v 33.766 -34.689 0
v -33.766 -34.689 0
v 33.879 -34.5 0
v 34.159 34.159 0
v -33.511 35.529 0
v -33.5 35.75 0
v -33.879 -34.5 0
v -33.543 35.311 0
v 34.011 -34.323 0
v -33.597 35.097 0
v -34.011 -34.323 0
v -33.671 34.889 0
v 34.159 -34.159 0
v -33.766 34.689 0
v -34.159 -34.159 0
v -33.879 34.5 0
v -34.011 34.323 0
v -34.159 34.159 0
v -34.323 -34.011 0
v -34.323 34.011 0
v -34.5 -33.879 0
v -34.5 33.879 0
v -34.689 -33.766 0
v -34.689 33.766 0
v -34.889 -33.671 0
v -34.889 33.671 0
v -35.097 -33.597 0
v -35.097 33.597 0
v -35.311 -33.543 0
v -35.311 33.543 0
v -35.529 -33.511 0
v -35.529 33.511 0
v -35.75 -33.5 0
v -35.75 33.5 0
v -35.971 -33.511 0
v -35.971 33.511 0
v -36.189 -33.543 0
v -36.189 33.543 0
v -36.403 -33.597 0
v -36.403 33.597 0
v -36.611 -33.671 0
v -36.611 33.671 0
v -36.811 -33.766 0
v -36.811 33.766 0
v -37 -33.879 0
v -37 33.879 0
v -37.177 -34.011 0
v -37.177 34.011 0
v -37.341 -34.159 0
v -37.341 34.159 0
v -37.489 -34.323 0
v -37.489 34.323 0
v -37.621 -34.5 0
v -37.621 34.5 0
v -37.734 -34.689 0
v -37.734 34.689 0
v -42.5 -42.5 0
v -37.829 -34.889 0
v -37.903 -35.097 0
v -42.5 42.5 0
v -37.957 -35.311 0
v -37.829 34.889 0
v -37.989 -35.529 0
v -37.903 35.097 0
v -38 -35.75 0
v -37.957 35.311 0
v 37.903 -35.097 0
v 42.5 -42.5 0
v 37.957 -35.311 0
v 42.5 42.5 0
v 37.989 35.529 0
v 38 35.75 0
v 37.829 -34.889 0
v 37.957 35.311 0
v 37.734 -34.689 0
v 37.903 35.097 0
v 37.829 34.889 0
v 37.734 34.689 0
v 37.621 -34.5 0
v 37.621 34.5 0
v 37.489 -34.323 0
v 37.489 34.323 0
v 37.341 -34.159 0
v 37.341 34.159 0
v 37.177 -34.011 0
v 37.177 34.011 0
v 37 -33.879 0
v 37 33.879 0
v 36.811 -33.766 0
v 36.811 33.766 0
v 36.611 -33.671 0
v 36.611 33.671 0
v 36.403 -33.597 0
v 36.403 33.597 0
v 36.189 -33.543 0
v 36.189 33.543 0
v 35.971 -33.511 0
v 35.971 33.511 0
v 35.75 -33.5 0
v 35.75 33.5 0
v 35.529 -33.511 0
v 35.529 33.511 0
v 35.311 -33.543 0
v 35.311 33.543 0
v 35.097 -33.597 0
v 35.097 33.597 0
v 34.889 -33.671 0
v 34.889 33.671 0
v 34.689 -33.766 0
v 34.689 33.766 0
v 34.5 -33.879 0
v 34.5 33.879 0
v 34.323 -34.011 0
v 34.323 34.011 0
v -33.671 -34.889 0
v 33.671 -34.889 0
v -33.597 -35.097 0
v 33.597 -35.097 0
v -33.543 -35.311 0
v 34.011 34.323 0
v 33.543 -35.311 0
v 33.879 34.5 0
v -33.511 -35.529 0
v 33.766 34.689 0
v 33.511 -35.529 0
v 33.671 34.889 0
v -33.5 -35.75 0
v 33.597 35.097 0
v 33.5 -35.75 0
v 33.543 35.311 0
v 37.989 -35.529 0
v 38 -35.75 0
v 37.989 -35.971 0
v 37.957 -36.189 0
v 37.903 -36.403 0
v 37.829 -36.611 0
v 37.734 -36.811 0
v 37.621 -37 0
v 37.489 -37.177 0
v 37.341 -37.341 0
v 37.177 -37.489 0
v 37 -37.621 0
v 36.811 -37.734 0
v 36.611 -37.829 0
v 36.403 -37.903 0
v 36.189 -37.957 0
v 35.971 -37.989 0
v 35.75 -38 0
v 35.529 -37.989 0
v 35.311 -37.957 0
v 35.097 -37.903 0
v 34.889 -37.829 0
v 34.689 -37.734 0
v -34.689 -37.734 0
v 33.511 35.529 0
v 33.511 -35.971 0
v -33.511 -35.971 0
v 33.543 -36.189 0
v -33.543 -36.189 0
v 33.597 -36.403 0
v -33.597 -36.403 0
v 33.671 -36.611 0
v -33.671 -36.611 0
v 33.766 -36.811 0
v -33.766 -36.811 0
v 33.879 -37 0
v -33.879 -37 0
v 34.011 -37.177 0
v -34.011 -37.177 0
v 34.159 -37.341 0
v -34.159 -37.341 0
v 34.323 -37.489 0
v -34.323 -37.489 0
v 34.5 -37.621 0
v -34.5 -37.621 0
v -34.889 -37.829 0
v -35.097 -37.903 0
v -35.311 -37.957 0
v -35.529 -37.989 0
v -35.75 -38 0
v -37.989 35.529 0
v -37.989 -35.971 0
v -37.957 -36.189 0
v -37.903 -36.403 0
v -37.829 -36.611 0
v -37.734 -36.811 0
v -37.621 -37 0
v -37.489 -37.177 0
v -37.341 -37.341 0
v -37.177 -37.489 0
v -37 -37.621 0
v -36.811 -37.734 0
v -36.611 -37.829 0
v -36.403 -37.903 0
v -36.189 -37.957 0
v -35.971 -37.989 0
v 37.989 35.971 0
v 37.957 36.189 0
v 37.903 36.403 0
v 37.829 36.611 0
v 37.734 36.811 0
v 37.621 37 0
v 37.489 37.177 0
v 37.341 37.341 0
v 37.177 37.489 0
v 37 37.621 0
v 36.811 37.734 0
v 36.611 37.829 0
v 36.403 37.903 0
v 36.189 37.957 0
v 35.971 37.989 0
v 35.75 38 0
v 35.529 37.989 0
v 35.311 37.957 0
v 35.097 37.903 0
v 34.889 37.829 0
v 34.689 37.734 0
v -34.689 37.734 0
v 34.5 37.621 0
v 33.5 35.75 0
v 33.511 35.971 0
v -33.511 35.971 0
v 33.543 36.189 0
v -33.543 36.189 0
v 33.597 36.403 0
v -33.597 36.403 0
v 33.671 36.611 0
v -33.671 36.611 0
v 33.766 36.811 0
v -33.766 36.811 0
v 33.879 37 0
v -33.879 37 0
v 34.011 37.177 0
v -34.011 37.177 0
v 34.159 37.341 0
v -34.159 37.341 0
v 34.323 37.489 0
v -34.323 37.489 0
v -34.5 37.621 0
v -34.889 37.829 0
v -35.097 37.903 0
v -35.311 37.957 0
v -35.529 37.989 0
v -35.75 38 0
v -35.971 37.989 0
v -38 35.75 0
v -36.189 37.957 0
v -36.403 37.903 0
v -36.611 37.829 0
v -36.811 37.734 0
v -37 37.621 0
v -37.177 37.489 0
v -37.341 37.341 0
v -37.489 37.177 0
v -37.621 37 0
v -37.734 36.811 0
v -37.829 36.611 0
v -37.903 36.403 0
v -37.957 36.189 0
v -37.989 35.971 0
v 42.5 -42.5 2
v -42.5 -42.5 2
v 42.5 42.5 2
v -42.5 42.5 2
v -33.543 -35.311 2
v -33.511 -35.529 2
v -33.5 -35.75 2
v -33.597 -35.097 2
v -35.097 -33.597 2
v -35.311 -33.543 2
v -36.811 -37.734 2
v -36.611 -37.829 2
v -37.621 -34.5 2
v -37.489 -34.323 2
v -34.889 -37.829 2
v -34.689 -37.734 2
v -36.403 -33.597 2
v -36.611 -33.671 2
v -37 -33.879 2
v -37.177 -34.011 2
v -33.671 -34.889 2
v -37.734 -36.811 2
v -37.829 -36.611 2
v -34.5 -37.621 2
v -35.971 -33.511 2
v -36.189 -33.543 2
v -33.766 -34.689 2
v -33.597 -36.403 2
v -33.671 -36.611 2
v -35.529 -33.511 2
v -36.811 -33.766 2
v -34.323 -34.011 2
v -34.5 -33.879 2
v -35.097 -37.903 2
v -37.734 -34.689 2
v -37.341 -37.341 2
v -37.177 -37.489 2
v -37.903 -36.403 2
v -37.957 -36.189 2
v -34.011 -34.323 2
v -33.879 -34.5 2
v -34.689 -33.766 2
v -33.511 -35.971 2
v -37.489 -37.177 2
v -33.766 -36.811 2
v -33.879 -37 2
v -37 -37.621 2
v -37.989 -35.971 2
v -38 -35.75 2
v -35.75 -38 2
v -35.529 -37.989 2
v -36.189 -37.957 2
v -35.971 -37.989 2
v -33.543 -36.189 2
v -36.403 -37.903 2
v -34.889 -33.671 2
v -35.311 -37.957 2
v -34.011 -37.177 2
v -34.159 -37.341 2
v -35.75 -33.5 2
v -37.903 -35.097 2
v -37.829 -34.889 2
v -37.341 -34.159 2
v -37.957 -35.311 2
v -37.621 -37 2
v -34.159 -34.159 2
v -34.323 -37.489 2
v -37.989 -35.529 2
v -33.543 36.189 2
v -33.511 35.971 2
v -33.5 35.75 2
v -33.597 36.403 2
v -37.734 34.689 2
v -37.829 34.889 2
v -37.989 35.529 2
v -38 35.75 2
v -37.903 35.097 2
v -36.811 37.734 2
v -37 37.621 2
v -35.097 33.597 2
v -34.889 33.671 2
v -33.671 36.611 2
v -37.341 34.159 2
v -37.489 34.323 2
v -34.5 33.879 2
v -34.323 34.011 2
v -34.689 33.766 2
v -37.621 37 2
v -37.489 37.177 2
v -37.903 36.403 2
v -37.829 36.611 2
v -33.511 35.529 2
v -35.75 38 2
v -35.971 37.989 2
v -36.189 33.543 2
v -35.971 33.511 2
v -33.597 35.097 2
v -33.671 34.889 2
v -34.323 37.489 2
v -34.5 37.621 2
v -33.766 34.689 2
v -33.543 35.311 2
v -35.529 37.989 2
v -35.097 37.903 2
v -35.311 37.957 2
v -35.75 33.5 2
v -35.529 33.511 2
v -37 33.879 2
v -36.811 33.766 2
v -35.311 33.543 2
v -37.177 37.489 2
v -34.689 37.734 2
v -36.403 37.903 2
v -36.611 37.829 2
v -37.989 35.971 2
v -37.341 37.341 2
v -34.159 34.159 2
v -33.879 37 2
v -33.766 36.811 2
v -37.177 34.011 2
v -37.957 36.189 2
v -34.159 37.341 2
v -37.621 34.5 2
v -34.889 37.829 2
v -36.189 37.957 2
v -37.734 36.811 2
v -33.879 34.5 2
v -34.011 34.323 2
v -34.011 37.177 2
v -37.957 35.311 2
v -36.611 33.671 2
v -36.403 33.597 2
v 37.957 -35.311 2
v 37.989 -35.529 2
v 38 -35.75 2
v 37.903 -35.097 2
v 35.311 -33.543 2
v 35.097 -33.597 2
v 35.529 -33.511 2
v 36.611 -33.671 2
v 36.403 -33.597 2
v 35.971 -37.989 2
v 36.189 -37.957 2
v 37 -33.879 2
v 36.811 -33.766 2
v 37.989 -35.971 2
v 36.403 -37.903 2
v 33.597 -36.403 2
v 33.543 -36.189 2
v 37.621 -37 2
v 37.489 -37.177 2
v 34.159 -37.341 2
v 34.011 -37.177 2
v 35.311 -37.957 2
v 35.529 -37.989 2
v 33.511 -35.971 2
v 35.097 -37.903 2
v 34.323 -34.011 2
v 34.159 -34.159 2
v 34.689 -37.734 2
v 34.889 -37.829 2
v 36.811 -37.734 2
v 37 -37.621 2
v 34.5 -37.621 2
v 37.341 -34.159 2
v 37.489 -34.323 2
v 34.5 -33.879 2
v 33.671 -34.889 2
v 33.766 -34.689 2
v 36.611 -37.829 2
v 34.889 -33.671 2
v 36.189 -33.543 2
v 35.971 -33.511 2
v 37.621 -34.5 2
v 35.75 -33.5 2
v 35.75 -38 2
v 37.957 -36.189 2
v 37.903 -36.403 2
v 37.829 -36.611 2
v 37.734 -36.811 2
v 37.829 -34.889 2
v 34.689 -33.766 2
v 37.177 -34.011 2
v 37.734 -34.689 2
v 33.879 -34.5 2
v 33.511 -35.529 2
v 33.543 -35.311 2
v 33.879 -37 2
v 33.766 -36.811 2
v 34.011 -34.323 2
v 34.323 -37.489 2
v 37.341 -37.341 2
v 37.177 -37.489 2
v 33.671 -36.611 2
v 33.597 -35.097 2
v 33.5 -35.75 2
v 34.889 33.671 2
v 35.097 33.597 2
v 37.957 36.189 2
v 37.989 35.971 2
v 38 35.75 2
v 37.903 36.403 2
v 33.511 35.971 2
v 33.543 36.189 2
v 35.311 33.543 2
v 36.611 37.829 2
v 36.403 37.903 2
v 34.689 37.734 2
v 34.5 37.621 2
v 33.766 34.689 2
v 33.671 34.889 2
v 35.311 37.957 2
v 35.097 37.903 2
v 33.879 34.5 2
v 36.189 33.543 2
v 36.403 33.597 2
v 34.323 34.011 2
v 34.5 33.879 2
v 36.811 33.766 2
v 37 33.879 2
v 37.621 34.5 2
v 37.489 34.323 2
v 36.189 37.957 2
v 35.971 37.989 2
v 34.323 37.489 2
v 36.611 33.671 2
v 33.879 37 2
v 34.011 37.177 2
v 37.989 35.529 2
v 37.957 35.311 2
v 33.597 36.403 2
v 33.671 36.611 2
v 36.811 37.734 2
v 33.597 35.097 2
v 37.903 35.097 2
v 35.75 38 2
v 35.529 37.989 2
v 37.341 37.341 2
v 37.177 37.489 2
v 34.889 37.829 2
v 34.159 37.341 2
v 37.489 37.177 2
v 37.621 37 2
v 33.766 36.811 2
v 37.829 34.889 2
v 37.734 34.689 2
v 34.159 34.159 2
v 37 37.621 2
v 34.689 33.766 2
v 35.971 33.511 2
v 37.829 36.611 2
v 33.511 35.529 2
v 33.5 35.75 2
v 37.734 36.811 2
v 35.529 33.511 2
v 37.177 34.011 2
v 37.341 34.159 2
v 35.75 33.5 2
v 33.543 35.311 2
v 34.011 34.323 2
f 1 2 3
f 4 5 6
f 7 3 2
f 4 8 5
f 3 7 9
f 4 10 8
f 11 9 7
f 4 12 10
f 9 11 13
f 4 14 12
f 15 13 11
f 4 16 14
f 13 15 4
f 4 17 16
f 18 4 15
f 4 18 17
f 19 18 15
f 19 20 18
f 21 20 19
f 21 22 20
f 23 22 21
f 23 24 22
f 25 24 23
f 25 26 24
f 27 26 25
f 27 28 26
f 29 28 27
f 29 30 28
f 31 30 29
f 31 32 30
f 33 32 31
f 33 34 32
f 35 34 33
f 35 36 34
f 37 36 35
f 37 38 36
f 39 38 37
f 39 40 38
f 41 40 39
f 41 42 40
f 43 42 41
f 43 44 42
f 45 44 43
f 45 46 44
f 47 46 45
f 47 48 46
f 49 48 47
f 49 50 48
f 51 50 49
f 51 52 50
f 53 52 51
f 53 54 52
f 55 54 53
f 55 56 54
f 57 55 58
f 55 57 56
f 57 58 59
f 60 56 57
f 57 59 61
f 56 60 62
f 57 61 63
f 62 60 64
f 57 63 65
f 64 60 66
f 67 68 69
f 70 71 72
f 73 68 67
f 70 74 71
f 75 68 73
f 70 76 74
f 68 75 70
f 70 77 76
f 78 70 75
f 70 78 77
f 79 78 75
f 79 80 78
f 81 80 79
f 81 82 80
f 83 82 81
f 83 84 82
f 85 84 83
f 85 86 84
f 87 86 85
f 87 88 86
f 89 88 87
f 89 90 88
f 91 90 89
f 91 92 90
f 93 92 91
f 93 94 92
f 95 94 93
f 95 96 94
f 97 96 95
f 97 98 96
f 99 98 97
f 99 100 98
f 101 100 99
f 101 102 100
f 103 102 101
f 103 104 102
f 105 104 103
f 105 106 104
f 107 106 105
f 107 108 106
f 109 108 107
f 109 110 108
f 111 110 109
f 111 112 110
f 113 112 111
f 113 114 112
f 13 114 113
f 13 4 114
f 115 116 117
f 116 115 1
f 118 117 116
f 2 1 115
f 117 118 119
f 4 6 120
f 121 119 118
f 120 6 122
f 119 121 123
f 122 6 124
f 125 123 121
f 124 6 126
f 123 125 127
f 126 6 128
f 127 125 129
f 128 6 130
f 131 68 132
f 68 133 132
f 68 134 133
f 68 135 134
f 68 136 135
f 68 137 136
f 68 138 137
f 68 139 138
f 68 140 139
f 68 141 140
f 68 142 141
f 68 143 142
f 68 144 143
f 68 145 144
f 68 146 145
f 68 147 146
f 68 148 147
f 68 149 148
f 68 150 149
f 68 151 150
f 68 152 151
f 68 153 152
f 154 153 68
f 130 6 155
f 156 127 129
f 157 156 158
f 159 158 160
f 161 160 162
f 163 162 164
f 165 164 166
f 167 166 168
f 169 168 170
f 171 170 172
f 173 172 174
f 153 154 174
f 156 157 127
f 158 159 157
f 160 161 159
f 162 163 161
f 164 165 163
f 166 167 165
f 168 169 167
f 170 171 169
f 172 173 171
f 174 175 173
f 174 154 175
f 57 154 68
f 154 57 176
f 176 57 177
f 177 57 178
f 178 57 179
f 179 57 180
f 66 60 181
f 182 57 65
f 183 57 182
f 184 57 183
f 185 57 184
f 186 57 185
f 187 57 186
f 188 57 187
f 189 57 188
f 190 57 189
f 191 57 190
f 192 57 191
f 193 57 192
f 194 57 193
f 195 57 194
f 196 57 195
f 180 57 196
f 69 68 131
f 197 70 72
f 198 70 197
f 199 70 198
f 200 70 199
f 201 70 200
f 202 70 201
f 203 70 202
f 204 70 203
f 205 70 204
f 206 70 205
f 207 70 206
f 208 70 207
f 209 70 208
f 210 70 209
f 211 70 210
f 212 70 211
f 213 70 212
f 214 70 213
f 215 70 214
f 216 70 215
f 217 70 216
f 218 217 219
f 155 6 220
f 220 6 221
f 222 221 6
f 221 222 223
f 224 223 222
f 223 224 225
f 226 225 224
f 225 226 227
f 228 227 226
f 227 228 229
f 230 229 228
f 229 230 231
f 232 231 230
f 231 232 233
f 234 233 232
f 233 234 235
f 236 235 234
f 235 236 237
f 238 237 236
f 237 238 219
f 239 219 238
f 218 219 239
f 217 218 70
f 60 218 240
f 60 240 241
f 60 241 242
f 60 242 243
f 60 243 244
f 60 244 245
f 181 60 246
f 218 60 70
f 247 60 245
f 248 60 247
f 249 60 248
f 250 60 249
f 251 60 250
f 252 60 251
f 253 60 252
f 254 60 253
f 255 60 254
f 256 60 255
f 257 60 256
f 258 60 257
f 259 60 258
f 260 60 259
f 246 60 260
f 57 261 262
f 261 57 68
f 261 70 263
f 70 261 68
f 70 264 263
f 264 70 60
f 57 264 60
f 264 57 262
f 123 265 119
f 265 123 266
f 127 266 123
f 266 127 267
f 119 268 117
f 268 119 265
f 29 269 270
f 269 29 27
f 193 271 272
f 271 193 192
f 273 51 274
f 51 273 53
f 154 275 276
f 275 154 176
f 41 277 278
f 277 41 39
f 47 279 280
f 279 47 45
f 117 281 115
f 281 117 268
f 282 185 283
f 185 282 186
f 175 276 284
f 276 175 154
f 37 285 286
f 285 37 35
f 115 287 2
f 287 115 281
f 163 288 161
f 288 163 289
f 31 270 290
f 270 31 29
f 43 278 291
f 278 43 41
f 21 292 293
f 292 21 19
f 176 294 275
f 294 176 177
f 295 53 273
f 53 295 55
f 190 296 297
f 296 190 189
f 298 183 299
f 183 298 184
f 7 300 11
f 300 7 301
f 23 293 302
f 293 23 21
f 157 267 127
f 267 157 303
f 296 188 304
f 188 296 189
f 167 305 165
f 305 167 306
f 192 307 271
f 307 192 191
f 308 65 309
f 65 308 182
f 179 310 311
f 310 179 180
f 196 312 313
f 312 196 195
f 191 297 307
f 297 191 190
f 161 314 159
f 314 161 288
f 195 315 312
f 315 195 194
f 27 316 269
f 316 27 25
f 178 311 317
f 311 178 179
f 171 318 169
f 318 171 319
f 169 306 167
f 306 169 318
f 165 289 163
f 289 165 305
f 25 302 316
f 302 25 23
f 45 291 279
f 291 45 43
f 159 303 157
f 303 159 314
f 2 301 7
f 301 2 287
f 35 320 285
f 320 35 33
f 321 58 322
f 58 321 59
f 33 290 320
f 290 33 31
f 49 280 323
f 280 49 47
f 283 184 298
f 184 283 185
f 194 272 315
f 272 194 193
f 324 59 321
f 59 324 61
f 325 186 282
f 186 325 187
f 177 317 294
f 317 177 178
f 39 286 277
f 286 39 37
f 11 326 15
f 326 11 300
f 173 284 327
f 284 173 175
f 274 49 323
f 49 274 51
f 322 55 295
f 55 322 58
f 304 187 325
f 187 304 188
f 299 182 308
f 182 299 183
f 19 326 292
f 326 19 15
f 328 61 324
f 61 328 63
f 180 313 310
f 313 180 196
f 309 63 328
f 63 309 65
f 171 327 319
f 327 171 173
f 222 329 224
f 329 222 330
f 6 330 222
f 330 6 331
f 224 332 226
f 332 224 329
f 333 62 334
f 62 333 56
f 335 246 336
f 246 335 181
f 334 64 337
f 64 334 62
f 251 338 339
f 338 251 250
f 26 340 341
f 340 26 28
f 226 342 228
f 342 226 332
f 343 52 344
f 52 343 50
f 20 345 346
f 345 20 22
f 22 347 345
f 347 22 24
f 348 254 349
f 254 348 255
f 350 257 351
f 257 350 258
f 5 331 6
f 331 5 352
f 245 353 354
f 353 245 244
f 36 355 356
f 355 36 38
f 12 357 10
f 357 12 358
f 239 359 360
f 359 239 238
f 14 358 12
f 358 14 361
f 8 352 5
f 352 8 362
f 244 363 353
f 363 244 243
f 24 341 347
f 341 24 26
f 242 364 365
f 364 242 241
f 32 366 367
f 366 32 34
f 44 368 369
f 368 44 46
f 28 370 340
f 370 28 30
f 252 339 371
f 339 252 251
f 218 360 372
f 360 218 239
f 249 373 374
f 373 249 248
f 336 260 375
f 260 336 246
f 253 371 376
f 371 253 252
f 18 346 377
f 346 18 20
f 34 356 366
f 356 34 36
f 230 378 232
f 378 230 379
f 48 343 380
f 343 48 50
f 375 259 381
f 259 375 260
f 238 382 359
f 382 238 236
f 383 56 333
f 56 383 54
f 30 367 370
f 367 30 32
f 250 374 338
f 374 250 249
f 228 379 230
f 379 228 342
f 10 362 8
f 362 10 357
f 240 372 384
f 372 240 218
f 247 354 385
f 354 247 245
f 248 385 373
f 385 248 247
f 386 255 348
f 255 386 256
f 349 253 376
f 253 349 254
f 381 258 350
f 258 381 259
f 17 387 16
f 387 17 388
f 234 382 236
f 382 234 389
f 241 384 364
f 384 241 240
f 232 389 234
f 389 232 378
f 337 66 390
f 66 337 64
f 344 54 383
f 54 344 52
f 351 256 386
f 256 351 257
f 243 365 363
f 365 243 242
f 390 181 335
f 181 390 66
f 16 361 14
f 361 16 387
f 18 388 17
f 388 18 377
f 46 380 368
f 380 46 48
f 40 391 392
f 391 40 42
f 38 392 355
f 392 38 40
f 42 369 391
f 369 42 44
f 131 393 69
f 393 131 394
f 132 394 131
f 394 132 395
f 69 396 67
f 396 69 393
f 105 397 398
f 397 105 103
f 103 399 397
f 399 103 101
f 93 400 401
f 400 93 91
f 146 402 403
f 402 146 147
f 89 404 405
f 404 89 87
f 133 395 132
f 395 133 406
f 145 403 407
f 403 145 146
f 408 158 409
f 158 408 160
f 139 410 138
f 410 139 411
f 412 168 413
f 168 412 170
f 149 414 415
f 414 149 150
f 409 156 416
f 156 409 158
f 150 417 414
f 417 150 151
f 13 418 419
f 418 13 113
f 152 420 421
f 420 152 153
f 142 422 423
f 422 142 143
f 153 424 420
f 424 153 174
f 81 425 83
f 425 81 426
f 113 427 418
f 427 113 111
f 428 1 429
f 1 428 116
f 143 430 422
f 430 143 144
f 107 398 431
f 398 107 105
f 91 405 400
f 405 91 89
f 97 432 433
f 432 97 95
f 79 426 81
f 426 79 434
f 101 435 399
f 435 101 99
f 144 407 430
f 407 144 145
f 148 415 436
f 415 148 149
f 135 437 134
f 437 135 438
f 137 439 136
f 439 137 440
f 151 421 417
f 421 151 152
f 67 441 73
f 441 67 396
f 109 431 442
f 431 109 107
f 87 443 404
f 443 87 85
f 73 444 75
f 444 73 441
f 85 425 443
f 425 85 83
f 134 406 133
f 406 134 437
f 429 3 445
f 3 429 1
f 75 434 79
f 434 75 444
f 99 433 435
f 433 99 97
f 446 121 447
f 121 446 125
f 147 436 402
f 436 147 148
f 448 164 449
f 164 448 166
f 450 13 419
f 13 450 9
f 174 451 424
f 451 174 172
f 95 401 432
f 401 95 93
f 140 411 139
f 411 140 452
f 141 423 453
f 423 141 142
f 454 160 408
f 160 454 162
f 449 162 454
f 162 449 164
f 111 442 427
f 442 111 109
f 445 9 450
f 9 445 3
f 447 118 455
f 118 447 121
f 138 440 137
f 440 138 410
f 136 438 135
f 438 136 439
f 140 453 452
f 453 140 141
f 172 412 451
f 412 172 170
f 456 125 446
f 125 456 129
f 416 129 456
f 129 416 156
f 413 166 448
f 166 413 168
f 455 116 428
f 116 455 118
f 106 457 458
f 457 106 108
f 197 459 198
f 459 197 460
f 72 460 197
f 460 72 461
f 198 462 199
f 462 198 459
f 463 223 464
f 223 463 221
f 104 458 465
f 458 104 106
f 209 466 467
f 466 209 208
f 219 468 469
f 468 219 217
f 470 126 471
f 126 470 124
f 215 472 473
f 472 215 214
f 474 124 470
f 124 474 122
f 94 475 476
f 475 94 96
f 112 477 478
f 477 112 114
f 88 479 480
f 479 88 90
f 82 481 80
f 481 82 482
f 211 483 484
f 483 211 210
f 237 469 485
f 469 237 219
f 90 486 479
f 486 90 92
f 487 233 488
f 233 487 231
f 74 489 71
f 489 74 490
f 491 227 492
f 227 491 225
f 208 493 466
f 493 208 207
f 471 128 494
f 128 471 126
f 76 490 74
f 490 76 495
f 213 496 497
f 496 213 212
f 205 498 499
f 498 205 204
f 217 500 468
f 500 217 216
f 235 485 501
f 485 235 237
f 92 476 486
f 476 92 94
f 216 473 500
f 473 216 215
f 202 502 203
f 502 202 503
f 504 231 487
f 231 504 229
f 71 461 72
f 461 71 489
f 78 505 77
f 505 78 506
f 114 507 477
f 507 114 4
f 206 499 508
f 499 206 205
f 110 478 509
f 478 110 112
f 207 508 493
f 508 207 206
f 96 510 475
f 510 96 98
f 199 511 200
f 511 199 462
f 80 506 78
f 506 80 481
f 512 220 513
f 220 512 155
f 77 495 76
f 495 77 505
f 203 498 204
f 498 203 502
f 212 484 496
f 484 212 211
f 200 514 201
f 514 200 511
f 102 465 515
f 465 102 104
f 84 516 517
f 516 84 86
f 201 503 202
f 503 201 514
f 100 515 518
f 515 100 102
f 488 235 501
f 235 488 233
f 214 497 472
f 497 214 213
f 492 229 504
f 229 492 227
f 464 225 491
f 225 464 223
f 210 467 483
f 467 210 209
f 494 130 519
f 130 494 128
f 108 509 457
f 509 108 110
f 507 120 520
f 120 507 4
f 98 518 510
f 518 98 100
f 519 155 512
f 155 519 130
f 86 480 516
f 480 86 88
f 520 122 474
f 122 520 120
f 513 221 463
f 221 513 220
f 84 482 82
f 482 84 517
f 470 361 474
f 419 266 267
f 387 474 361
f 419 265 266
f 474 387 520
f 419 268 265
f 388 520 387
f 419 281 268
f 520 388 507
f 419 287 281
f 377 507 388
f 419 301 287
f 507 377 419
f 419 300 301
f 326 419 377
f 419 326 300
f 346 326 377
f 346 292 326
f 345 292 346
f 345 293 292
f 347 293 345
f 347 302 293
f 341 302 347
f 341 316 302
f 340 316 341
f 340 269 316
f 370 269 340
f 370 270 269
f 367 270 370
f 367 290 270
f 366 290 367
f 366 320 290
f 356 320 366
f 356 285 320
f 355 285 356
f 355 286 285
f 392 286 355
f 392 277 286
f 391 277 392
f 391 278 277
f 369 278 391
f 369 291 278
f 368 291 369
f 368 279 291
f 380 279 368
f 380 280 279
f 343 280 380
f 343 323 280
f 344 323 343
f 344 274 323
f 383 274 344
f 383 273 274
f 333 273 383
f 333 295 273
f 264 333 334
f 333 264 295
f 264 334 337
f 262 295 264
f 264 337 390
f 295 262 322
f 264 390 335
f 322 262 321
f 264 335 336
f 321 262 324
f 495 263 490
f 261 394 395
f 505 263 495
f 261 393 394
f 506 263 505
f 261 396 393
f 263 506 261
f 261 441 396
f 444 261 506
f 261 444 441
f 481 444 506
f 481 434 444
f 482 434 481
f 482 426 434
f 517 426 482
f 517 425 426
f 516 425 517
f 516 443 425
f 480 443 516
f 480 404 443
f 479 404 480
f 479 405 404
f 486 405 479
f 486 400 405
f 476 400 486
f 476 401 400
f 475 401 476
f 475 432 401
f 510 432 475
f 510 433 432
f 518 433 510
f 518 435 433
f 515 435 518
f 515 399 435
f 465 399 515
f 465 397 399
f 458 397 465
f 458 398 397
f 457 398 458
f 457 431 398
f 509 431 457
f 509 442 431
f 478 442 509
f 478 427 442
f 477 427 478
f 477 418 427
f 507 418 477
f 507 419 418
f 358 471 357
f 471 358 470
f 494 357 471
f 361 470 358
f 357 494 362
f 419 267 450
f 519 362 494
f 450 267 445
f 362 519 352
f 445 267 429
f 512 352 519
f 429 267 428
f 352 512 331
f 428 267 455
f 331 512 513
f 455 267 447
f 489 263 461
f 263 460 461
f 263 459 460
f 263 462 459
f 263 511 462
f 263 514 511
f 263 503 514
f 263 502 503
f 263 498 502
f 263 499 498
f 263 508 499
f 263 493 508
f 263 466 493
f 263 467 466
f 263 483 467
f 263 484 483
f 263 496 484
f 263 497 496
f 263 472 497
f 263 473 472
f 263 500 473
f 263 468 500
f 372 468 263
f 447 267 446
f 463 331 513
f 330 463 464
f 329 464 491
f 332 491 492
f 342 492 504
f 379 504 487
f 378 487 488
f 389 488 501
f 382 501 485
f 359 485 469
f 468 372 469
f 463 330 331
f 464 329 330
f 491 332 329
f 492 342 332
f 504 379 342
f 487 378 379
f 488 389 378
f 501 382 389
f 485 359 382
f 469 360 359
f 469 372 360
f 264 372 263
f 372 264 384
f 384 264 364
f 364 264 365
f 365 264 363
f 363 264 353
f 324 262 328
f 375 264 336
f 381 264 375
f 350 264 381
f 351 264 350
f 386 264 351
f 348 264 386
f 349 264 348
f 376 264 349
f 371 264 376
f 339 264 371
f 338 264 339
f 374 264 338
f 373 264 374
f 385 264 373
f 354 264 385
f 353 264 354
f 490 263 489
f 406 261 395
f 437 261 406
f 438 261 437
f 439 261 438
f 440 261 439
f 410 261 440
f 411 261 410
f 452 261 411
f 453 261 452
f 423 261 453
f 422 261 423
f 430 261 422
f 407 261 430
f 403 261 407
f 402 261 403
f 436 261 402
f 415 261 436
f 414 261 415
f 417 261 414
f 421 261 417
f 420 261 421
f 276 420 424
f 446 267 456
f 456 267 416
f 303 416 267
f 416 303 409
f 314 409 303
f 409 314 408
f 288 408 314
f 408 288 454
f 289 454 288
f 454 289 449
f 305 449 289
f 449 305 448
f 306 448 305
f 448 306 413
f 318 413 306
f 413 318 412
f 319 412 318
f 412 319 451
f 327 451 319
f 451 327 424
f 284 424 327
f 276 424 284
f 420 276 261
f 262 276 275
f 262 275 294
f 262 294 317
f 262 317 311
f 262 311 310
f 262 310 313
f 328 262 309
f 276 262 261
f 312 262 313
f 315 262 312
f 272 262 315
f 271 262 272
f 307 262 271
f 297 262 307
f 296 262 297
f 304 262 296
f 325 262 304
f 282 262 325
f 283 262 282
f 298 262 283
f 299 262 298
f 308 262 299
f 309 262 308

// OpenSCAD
// DIY magnetic stirrer housing - upside-down open box over PC fan
// Print orientation: top plate on bed (z = 0), walls rise to open top (z = 40)

$fn = 64;

// ---- Dimensions (mm) ----
plate_t      = 2;     // top plate thickness
wall_t       = 2.5;   // wall thickness
box_h        = 40;    // total height (open top at z = 40)
outer_x      = 90;    // outer size in X
outer_y      = 90;    // outer size in Y
hole_d       = 4.5;   // M4 screw hole diameter
hole_n       = 4;     // number of screw holes
hole_pitch   = 71.5;  // square hole pattern side length
notch_w      = 12;    // cable notch width
notch_d      = 8;     // cable notch depth from open edge (z = 32 to 40)
eps          = 0.5;   // cutter overshoot past faces

// ---- Model ----
difference() {
    // Closed top plate
    translate([-outer_x/2, -outer_y/2, 0])
        cube([outer_x, outer_y, plate_t]);

    // Four walls, open top, with screw holes through the plate
    for (a = [0, 90, 180, 270])
        rotate([0, 0, a])
            translate([-outer_x/2, -outer_y/2, 0])
                cube([outer_x, wall_t, box_h]);

    // M4 screw holes in top plate, centred on plate
    for (i = [0 : hole_n - 1])
        for (j = [0 : hole_n - 1]) {
            x = (i - (hole_n - 1)/2) * hole_pitch;
            y = (j - (hole_n - 1)/2) * hole_pitch;
            translate([x, y, -eps])
                cylinder(d = hole_d, h = plate_t + 2*eps);
        }

    // Cable notch in one wall, centred along the wall
    translate([-outer_x/2 + notch_w/2, -outer_y/2, box_h - notch_d])
        cube([notch_w, outer_y, notch_d]);
}
